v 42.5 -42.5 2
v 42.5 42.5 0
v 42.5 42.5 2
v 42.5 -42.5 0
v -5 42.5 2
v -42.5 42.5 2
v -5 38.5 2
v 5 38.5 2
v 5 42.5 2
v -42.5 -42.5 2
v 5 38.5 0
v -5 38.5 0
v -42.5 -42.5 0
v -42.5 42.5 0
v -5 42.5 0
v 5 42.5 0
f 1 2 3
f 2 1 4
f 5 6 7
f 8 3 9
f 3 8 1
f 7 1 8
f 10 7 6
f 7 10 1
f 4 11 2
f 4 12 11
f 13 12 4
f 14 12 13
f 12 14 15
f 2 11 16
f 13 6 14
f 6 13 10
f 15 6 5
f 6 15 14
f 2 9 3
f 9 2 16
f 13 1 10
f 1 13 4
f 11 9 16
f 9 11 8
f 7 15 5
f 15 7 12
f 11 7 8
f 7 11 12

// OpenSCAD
// Sowing template for 90 mm Petri dish
// Flat disc with grid of holes and orientation notch.

$fn = 64;

// Dimensions
DISH_DIA = 90;
DISC_DIA = 85;
THICKNESS = 2;
HOLE_COUNT = 7;
HOLE_DIA = 3;
HOLE_SPACING = 9;
NOTCH_WIDTH = 10;
NOTCH_DEPTH = 4;

// Calculate grid positions
// n features spaced p apart and centred on the origin sit at (i - (n - 1) / 2) * p
grid_offset = (HOLE_COUNT - 1) / 2 * HOLE_SPACING;

difference() {
    // Main disc body
    translate([-DISC_DIA / 2, -DISC_DIA / 2, 0])
        cube([DISC_DIA, DISC_DIA, THICKNESS]);

    // Grid of holes
    for (i = [0 : HOLE_COUNT - 1]) {
        x_pos = (i - grid_offset) * HOLE_SPACING;
        translate([x_pos, 0, -1])
            cylinder(h = THICKNESS + 2, d = HOLE_DIA);
    }

    // Orientation notch on the +Y side
    // Notch is 10 mm wide (X) and 4 mm deep (Y, measured in from the rim)
    // The disc radius is 42.5 mm. The notch starts at Y = 42.5 - 4 = 38.5 mm.
    // The notch extends from X = -5 to X = +5 mm (centered on the Y axis).
    translate([-NOTCH_WIDTH / 2, DISC_DIA / 2 - NOTCH_DEPTH, -1])
        cube([NOTCH_WIDTH, NOTCH_DEPTH, THICKNESS + 2]);
}
